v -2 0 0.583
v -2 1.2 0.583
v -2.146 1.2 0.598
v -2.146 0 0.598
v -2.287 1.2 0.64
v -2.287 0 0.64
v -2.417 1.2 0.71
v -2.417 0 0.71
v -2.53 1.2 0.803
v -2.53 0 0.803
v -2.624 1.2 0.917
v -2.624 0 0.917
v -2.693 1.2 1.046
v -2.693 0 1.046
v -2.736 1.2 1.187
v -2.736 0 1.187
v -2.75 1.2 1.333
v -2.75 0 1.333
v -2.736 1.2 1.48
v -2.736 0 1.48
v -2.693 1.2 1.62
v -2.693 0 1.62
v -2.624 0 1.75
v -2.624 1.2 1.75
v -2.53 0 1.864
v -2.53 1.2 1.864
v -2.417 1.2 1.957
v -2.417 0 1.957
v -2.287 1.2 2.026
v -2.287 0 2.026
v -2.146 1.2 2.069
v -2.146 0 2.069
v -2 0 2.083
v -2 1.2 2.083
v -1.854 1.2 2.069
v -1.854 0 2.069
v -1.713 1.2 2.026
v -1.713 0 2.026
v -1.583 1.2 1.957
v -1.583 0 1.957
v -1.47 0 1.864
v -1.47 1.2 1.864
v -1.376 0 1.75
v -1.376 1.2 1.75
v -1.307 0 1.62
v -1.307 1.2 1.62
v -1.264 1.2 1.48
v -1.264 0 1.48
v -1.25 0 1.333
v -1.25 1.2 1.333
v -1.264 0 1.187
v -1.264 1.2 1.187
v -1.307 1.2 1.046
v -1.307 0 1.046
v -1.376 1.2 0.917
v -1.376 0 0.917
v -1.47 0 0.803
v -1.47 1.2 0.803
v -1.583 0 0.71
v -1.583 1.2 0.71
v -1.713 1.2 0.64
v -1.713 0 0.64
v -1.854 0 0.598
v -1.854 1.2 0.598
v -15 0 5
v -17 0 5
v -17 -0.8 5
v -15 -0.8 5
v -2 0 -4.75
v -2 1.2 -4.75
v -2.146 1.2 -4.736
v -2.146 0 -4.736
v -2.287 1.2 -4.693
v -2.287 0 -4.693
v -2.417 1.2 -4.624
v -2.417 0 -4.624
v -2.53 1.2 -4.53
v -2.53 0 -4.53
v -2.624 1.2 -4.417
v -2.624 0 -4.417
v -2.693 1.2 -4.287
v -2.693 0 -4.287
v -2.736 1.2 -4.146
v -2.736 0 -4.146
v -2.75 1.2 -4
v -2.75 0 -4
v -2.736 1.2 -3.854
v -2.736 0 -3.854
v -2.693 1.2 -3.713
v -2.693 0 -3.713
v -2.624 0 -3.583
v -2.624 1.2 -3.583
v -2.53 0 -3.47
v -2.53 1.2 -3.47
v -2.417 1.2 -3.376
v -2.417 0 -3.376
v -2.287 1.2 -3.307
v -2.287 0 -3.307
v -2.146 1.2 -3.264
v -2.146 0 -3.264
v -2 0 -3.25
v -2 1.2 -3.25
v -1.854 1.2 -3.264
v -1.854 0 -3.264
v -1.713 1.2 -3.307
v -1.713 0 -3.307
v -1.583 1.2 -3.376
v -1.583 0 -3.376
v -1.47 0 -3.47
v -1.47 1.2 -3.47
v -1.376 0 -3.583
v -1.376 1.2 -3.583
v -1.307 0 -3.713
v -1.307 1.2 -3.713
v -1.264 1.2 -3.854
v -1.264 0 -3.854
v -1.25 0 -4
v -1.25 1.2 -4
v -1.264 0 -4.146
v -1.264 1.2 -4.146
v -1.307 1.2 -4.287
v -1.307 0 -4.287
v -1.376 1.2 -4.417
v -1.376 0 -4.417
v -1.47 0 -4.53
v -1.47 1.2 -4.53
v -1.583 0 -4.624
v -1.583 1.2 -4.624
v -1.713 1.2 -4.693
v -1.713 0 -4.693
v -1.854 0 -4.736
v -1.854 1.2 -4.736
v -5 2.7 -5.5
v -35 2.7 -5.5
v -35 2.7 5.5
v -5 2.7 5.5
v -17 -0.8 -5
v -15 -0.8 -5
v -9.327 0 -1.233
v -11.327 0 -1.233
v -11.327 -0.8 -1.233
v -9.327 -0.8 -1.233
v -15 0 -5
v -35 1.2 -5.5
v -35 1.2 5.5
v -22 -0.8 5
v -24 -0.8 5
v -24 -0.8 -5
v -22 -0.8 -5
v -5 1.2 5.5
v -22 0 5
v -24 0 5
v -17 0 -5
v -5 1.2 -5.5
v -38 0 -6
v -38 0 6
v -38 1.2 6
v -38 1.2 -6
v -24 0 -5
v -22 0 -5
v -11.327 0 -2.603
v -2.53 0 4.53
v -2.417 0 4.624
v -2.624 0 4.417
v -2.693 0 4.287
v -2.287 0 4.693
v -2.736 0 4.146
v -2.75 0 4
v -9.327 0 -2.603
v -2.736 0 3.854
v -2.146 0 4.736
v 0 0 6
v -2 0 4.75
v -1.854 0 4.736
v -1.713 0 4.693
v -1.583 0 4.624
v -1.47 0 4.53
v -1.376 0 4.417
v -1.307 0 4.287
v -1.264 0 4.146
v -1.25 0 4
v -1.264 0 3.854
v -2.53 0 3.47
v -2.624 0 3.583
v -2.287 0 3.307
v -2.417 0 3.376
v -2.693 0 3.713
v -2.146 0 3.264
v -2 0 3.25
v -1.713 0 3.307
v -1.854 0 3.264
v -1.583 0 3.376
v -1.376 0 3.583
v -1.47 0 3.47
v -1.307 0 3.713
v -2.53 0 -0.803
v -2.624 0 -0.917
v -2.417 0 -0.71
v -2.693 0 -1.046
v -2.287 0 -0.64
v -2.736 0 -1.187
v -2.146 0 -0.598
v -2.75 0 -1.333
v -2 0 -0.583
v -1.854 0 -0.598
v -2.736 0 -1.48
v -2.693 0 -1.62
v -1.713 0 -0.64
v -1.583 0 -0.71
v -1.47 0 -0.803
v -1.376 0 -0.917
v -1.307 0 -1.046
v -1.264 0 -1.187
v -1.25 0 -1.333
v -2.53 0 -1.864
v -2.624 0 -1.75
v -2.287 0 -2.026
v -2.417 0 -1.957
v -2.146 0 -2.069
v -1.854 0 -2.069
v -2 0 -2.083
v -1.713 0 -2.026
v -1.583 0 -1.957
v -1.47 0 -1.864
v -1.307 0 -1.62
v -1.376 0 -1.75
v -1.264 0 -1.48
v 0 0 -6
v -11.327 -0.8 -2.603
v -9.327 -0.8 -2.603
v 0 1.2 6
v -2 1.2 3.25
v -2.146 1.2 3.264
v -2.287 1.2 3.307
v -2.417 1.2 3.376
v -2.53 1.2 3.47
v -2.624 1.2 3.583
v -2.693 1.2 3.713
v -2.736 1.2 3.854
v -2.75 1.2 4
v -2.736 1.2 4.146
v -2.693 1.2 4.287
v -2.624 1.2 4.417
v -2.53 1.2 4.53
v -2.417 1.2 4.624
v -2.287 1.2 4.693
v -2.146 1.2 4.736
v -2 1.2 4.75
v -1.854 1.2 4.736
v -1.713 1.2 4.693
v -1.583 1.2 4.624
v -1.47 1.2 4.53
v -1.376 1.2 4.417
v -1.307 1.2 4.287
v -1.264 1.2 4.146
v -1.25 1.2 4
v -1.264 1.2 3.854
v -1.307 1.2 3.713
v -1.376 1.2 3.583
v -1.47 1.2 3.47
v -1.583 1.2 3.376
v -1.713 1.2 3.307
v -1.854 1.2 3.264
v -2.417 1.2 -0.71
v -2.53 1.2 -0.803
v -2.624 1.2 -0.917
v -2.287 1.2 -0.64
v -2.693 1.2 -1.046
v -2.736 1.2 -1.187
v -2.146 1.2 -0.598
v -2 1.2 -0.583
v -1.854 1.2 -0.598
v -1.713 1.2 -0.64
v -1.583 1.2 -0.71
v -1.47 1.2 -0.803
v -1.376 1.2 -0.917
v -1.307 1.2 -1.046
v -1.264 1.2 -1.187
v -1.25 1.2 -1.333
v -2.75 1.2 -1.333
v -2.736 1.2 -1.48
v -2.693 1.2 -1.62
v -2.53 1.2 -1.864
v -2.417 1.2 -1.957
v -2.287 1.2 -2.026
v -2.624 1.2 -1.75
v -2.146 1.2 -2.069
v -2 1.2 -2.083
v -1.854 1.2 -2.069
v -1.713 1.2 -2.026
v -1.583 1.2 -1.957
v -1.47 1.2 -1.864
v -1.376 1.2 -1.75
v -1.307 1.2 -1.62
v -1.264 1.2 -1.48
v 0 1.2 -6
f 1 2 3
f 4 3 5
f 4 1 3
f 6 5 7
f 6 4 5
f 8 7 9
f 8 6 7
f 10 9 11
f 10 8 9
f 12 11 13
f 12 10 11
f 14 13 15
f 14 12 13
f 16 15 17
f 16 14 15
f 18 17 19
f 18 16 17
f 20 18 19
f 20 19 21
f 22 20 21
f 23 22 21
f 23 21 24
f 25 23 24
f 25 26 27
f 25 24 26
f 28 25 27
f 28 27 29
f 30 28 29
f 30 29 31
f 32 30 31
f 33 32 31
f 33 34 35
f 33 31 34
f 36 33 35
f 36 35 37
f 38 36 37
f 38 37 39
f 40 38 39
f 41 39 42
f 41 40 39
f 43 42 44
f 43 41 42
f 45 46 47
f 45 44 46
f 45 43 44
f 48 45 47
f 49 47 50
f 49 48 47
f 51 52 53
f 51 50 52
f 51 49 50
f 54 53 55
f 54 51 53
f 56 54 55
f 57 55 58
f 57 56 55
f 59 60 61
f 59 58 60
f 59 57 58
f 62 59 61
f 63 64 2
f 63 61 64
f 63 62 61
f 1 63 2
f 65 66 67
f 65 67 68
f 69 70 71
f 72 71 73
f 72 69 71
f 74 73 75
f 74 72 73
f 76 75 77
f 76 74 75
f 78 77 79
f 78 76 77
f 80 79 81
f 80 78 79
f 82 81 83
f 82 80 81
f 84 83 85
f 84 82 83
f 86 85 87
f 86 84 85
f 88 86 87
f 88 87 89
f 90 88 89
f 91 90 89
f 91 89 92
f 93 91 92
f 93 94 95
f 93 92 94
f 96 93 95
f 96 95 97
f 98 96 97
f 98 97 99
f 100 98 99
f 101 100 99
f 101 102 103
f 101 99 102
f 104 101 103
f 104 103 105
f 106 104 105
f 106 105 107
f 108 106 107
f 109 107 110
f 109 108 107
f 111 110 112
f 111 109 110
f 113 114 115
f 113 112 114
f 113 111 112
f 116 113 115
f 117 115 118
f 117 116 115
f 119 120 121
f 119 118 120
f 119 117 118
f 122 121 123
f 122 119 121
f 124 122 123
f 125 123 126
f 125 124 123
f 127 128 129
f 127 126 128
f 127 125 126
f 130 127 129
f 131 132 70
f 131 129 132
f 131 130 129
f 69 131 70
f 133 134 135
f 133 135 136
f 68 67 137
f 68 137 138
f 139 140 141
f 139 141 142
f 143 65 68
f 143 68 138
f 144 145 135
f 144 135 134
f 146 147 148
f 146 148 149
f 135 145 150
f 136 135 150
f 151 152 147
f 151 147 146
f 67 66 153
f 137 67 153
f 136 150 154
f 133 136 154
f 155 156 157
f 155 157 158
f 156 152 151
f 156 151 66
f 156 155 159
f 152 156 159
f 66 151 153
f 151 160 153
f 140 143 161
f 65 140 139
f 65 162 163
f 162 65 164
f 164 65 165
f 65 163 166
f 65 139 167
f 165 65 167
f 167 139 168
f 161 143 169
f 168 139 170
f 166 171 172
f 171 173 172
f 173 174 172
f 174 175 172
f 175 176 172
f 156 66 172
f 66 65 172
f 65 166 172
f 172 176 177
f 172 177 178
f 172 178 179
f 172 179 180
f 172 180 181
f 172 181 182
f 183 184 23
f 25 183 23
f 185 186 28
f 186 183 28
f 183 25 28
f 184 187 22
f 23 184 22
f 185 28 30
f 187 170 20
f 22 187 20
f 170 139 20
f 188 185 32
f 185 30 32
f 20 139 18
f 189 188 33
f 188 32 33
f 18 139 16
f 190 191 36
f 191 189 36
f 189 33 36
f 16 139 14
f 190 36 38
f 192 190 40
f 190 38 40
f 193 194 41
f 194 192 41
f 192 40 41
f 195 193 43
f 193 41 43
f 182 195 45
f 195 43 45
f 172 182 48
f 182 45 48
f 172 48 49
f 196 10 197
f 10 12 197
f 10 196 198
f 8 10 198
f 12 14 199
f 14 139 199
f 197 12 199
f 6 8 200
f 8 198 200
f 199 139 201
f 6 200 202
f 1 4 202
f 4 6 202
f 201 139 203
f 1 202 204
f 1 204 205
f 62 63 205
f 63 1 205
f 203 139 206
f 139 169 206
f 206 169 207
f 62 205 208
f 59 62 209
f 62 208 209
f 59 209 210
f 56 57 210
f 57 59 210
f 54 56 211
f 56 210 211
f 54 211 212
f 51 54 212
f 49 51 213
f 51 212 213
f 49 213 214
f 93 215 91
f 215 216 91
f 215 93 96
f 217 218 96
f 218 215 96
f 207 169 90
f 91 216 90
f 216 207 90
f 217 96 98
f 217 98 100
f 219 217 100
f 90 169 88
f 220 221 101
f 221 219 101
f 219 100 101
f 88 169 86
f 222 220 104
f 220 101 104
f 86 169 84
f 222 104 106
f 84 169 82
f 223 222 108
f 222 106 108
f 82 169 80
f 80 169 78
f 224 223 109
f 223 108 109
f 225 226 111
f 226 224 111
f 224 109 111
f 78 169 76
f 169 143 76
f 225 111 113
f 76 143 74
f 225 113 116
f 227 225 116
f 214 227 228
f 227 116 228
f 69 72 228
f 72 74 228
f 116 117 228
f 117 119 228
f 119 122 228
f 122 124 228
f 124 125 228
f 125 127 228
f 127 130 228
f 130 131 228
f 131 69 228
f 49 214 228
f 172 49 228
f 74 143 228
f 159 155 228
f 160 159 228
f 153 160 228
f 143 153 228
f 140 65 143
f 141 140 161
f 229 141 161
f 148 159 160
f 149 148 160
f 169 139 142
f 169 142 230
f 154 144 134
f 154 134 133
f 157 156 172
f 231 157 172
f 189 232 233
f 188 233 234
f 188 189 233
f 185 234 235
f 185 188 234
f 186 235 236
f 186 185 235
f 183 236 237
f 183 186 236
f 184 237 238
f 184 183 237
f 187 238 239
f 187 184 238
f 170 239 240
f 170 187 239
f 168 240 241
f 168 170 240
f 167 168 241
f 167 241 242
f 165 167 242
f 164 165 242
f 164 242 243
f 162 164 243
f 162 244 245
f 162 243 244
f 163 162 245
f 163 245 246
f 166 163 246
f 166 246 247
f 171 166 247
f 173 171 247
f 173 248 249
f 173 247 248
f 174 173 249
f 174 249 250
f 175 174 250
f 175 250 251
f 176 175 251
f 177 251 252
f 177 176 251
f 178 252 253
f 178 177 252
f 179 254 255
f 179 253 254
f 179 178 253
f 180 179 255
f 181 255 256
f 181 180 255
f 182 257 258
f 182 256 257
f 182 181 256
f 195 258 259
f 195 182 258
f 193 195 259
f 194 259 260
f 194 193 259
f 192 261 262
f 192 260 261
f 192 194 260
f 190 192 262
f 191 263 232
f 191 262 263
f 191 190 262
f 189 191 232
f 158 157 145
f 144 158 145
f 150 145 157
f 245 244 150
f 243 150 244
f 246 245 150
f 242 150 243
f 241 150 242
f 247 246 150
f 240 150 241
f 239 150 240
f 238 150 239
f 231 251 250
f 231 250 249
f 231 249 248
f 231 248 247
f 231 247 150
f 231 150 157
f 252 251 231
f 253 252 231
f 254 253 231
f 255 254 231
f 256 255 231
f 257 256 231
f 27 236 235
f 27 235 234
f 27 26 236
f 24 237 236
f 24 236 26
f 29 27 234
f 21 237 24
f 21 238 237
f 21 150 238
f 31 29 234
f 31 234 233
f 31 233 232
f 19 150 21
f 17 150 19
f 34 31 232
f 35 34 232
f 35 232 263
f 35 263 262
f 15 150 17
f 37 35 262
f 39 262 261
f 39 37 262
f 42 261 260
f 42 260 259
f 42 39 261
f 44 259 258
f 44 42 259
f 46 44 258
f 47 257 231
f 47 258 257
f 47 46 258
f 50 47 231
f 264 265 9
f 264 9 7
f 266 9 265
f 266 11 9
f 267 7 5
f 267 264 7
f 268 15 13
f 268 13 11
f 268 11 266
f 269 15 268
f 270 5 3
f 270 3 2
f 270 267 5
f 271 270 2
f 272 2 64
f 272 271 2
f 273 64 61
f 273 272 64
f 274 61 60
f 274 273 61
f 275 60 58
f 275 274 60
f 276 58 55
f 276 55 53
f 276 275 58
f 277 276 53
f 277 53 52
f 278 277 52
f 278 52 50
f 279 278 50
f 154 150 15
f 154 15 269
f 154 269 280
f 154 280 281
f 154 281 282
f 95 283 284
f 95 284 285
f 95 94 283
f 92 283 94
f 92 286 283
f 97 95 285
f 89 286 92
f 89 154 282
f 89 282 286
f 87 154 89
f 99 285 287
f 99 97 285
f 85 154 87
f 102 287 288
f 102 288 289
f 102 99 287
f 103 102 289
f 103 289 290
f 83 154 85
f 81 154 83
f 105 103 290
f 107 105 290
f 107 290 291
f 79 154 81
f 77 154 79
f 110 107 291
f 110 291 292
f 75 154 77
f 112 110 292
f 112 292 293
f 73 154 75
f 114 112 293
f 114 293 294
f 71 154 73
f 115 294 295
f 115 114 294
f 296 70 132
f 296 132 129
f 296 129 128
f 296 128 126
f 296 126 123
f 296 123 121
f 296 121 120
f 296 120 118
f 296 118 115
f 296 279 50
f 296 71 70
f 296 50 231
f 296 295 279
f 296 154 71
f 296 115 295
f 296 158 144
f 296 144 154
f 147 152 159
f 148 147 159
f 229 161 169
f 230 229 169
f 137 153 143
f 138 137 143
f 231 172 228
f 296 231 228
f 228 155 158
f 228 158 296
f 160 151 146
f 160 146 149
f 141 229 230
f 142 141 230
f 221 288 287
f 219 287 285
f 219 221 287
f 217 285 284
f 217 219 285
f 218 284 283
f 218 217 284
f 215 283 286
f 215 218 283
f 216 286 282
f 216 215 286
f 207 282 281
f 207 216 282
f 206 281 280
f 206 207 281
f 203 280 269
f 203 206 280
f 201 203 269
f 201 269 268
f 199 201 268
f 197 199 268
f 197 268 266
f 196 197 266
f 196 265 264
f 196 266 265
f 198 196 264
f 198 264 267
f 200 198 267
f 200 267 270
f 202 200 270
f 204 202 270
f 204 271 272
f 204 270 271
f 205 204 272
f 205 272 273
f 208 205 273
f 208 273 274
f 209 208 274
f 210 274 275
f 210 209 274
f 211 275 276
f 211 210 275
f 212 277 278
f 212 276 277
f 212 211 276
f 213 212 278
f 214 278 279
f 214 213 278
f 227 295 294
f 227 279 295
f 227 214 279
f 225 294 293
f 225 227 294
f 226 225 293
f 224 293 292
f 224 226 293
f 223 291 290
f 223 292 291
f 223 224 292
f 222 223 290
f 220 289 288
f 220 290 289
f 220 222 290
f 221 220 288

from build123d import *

# Parameters (mm, degrees)
SKETCH_1_W          = 38
SKETCH_1_H          = 12
EXTRUDE_1_DEPTH     = 1.2
SKETCH_2_W          = 30
SKETCH_2_H          = 11
EXTRUDE_2_DEPTH     = 2.7
SKETCH_3_R          = 0.75
CUT_EXTRUDE_2_DEPTH = 39.565399
EXTRUDE_START       = 1.2
SKETCH_4_W          = 2
SKETCH_4_H          = 10
SKETCH_4_H_2        = 1.370131764
EXTRUDE_3_DEPTH     = 2


with BuildPart() as part:
    # Эскиз1 → Бобышка-Вытянуть1 (new body)
    with BuildSketch(Plane(origin=(0, 0, 0), x_dir=(1, 0, 0), z_dir=(0, 1, 0))):
        with Locations((-19, 0)):
            Rectangle(SKETCH_1_W, SKETCH_1_H)
    extrude(amount=EXTRUDE_1_DEPTH)

    # Эскиз2 → Бобышка-Вытянуть2 (add)
    with BuildSketch(Plane(origin=(0, 0, 0), x_dir=(1, 0, 0), z_dir=(0, 1, 0))):
        with Locations((-20, 0)):
            Rectangle(SKETCH_2_W, SKETCH_2_H)
    extrude(amount=EXTRUDE_2_DEPTH)

    # Эскиз3 → Вырез-Вытянуть2 (cut, through all)
    with BuildSketch(Plane(origin=(0, 0, 0), x_dir=(1, 0, 0), z_dir=(0, 1, 0))):
        with Locations(Location((-2, 4, 0), (0, 0, 90))):
            Circle(SKETCH_3_R)
        with Locations(Location((-2, 1.333333333, 0), (0, 0, 90))):
            Circle(SKETCH_3_R)
        with Locations(Location((-2, -1.333333333, 0), (0, 0, 90))):
            Circle(SKETCH_3_R)
        with Locations(Location((-2, -4, 0), (0, 0, 90))):
            Circle(SKETCH_3_R)
    extrude(amount=CUT_EXTRUDE_2_DEPTH, mode=Mode.SUBTRACT)

    # Эскиз4 → Бобышка-Вытянуть3 (add)
    with BuildSketch(Plane(origin=(0, 0, 0), x_dir=(1, 0, 0), z_dir=(0, 1, 0)).offset(EXTRUDE_START)):
        with Locations((-23, 0)):
            Rectangle(SKETCH_4_W, SKETCH_4_H)
        with Locations((-16, 0)):
            Rectangle(SKETCH_4_W, SKETCH_4_H)
        with Locations((-10.327262123, 1.918184469)):
            Rectangle(SKETCH_4_W, SKETCH_4_H_2)
    extrude(amount=-EXTRUDE_3_DEPTH)


solid = part.part
